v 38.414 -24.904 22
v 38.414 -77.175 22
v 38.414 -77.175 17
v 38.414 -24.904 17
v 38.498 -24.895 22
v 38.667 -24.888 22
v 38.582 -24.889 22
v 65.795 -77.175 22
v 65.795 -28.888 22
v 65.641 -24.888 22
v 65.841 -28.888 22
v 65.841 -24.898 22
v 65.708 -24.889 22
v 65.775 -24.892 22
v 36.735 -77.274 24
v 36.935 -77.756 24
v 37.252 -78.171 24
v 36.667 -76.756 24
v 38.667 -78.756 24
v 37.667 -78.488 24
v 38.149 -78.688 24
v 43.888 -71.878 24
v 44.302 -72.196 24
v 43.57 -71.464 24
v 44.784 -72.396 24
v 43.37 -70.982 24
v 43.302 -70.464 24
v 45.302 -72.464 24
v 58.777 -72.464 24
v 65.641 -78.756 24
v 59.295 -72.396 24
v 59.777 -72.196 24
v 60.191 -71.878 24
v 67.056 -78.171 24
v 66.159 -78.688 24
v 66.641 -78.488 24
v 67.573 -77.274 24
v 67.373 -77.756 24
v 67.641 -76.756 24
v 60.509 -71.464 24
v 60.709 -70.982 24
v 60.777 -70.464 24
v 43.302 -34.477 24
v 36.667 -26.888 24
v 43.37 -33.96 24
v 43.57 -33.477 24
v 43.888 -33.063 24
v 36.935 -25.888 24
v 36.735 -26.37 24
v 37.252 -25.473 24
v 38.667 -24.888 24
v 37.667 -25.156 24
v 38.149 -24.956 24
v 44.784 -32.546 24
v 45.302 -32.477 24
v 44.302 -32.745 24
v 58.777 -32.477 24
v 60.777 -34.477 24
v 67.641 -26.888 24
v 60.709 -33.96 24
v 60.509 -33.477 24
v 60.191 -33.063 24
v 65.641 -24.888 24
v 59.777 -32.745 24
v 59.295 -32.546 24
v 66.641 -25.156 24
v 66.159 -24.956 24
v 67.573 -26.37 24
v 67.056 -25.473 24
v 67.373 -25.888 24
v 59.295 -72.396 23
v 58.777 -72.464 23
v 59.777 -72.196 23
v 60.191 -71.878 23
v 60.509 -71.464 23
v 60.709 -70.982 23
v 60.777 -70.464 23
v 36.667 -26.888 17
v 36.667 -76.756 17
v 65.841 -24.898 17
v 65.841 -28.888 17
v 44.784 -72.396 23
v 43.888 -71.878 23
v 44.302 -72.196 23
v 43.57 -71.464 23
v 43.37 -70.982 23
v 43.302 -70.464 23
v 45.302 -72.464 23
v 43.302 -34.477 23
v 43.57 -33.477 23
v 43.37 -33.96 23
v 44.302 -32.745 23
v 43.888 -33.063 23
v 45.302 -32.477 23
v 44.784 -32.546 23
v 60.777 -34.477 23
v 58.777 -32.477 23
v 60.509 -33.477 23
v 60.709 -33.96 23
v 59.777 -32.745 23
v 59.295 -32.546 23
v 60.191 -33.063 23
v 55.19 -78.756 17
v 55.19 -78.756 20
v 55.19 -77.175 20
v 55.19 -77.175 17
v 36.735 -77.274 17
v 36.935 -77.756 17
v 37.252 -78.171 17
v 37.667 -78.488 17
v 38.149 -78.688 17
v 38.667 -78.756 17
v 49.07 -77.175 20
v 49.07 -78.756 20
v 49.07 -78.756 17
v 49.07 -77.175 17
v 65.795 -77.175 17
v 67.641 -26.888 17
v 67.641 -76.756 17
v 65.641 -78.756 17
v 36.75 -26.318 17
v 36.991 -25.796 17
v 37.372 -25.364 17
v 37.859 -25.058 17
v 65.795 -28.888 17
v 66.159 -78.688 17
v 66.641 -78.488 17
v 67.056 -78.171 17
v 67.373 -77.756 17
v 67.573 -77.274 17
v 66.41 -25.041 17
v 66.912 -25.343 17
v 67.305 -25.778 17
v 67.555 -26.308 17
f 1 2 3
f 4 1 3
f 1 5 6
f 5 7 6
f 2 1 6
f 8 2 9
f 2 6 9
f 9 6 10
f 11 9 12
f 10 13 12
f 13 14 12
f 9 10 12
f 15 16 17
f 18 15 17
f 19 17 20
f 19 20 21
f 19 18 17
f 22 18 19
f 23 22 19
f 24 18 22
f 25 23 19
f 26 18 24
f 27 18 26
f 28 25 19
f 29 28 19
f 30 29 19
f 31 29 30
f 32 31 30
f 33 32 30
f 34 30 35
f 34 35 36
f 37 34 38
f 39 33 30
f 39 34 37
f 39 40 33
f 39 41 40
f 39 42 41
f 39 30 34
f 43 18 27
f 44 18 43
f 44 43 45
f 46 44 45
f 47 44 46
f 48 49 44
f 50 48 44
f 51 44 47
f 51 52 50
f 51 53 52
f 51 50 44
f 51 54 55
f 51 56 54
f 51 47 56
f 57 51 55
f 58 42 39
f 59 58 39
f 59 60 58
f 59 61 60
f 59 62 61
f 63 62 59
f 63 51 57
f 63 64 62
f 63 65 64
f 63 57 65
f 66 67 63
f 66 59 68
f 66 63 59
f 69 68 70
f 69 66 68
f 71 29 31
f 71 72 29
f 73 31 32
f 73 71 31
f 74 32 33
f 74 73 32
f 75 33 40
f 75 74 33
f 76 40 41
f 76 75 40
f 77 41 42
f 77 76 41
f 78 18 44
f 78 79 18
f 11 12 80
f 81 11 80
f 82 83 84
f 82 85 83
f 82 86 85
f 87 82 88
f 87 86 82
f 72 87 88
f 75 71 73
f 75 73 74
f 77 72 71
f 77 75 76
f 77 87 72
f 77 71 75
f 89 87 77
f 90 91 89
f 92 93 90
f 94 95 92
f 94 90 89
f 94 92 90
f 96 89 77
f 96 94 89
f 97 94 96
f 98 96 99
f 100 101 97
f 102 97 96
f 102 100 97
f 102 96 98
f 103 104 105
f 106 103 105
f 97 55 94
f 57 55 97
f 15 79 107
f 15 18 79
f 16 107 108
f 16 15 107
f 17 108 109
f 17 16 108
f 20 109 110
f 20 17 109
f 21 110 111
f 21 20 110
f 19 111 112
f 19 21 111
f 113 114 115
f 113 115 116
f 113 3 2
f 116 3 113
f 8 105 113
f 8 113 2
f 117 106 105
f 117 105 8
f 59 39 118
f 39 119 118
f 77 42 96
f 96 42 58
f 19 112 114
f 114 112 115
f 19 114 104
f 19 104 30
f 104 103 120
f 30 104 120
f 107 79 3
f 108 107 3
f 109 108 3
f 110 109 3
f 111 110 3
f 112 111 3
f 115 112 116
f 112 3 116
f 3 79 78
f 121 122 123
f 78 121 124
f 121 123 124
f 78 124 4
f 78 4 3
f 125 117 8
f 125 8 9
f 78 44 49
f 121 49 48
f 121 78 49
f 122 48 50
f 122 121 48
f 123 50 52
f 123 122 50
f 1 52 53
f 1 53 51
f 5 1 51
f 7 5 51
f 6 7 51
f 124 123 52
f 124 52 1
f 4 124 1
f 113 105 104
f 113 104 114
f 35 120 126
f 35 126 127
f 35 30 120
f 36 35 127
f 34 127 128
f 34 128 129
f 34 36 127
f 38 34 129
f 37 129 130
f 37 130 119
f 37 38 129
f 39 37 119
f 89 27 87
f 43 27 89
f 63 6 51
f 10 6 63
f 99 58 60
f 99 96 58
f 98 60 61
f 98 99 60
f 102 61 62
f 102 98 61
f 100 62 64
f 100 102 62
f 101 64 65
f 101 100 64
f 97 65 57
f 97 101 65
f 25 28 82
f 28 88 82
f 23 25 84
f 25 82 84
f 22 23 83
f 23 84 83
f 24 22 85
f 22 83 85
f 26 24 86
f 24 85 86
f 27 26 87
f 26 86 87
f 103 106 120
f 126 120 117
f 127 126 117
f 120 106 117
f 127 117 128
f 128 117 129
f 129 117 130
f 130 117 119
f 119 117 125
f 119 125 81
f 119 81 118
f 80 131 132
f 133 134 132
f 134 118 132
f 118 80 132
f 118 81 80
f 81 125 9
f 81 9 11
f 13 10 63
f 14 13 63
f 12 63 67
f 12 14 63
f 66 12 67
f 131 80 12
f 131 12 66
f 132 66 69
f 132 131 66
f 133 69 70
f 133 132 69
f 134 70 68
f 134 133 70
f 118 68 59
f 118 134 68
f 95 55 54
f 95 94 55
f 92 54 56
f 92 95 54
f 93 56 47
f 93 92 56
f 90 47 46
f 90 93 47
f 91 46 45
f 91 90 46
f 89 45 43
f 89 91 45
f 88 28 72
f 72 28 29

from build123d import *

# Parameters (mm, degrees)
SKETCH_5_W          = 30.974653289
SKETCH_5_H          = 53.868777402
SKETCH_5_W_2        = 27.381586342
SKETCH_5_H_2        = 50.41539456
EXTRUDE_3_DEPTH     = 5
SKETCH_6_W          = 27.427442828
SKETCH_6_H          = 5
CUT_EXTRUDE_4_DEPTH = 4
SKETCH_8_W          = 6.119989238
SKETCH_8_H          = 1.581115617
CUT_EXTRUDE_6_DEPTH = 3
SKETCH_9_W          = 30.974653289
SKETCH_9_H          = 53.868777402
EXTRUDE_5_DEPTH     = 2
SKETCH_10_W         = 17.475002228
SKETCH_10_H         = 39.986467982
CUT_EXTRUDE_7_DEPTH = 1
FILLET_1_R          = 2
FILLET_2_R          = 2


with BuildPart() as part:
    # 草图5 → 凸台-拉伸3 (new body)
    with BuildSketch(Plane.XY.offset(17)):
        with Locations((52.154033433, -51.822040042)):
            Rectangle(SKETCH_5_W, SKETCH_5_H)
        with Locations((52.104679946, -51.967615846)):
            Rectangle(SKETCH_5_W_2, SKETCH_5_H_2, mode=Mode.SUBTRACT)
    extrude(amount=EXTRUDE_3_DEPTH)

    # 草图6 → 切除-拉伸4 (cut)
    with BuildSketch(Plane(origin=(0, -24.887651341, 0), x_dir=(1, 0, 0), z_dir=(0, 1, 0))):
        with Locations((52.127608189, -19.5)):
            Rectangle(SKETCH_6_W, SKETCH_6_H)
    extrude(amount=-CUT_EXTRUDE_4_DEPTH, mode=Mode.SUBTRACT)

    # 草图8 → 切除-拉伸6 (cut)
    with BuildSketch(Plane(origin=(0, 0, 17), x_dir=(-1, 0, 0), z_dir=(0, 0, -1))):
        with Locations((-52.130085605, -77.965870935)):
            Rectangle(SKETCH_8_W, SKETCH_8_H)
    extrude(amount=-CUT_EXTRUDE_6_DEPTH, mode=Mode.SUBTRACT)

    # 草图9 → 凸台-拉伸5 (add)
    with BuildSketch(Plane.XY.offset(22)):
        with Locations((52.154033433, -51.822040042)):
            Rectangle(SKETCH_9_W, SKETCH_9_H)
    extrude(amount=EXTRUDE_5_DEPTH)

    # 草图10 → 切除-拉伸7 (cut)
    with BuildSketch(Plane.XY.offset(24)):
        with Locations((52.039568352, -52.470675496)):
            Rectangle(SKETCH_10_W, SKETCH_10_H)
    extrude(amount=-CUT_EXTRUDE_7_DEPTH, mode=Mode.SUBTRACT)

    # 圆角1
    fillet_1_edges = [part.edges().sort_by_distance(p)[0] for p in [
        (67.641360077, -78.756428743, 20.5),
        (36.666706788, -78.756428743, 20.5),
        (36.666706788, -24.887651341, 20.5),
        (67.641360077, -24.887651341, 20.5),
    ]]
    fillet(fillet_1_edges, radius=FILLET_1_R)

    # 圆角2
    fillet_2_edges = [part.edges().sort_by_distance(p)[0] for p in [
        (43.302067238, -72.463909487, 23.5),
        (43.302067238, -32.477441505, 23.5),
        (60.777069466, -32.477441505, 23.5),
        (60.777069466, -72.463909487, 23.5),
    ]]
    fillet(fillet_2_edges, radius=FILLET_2_R)


solid = part.part
